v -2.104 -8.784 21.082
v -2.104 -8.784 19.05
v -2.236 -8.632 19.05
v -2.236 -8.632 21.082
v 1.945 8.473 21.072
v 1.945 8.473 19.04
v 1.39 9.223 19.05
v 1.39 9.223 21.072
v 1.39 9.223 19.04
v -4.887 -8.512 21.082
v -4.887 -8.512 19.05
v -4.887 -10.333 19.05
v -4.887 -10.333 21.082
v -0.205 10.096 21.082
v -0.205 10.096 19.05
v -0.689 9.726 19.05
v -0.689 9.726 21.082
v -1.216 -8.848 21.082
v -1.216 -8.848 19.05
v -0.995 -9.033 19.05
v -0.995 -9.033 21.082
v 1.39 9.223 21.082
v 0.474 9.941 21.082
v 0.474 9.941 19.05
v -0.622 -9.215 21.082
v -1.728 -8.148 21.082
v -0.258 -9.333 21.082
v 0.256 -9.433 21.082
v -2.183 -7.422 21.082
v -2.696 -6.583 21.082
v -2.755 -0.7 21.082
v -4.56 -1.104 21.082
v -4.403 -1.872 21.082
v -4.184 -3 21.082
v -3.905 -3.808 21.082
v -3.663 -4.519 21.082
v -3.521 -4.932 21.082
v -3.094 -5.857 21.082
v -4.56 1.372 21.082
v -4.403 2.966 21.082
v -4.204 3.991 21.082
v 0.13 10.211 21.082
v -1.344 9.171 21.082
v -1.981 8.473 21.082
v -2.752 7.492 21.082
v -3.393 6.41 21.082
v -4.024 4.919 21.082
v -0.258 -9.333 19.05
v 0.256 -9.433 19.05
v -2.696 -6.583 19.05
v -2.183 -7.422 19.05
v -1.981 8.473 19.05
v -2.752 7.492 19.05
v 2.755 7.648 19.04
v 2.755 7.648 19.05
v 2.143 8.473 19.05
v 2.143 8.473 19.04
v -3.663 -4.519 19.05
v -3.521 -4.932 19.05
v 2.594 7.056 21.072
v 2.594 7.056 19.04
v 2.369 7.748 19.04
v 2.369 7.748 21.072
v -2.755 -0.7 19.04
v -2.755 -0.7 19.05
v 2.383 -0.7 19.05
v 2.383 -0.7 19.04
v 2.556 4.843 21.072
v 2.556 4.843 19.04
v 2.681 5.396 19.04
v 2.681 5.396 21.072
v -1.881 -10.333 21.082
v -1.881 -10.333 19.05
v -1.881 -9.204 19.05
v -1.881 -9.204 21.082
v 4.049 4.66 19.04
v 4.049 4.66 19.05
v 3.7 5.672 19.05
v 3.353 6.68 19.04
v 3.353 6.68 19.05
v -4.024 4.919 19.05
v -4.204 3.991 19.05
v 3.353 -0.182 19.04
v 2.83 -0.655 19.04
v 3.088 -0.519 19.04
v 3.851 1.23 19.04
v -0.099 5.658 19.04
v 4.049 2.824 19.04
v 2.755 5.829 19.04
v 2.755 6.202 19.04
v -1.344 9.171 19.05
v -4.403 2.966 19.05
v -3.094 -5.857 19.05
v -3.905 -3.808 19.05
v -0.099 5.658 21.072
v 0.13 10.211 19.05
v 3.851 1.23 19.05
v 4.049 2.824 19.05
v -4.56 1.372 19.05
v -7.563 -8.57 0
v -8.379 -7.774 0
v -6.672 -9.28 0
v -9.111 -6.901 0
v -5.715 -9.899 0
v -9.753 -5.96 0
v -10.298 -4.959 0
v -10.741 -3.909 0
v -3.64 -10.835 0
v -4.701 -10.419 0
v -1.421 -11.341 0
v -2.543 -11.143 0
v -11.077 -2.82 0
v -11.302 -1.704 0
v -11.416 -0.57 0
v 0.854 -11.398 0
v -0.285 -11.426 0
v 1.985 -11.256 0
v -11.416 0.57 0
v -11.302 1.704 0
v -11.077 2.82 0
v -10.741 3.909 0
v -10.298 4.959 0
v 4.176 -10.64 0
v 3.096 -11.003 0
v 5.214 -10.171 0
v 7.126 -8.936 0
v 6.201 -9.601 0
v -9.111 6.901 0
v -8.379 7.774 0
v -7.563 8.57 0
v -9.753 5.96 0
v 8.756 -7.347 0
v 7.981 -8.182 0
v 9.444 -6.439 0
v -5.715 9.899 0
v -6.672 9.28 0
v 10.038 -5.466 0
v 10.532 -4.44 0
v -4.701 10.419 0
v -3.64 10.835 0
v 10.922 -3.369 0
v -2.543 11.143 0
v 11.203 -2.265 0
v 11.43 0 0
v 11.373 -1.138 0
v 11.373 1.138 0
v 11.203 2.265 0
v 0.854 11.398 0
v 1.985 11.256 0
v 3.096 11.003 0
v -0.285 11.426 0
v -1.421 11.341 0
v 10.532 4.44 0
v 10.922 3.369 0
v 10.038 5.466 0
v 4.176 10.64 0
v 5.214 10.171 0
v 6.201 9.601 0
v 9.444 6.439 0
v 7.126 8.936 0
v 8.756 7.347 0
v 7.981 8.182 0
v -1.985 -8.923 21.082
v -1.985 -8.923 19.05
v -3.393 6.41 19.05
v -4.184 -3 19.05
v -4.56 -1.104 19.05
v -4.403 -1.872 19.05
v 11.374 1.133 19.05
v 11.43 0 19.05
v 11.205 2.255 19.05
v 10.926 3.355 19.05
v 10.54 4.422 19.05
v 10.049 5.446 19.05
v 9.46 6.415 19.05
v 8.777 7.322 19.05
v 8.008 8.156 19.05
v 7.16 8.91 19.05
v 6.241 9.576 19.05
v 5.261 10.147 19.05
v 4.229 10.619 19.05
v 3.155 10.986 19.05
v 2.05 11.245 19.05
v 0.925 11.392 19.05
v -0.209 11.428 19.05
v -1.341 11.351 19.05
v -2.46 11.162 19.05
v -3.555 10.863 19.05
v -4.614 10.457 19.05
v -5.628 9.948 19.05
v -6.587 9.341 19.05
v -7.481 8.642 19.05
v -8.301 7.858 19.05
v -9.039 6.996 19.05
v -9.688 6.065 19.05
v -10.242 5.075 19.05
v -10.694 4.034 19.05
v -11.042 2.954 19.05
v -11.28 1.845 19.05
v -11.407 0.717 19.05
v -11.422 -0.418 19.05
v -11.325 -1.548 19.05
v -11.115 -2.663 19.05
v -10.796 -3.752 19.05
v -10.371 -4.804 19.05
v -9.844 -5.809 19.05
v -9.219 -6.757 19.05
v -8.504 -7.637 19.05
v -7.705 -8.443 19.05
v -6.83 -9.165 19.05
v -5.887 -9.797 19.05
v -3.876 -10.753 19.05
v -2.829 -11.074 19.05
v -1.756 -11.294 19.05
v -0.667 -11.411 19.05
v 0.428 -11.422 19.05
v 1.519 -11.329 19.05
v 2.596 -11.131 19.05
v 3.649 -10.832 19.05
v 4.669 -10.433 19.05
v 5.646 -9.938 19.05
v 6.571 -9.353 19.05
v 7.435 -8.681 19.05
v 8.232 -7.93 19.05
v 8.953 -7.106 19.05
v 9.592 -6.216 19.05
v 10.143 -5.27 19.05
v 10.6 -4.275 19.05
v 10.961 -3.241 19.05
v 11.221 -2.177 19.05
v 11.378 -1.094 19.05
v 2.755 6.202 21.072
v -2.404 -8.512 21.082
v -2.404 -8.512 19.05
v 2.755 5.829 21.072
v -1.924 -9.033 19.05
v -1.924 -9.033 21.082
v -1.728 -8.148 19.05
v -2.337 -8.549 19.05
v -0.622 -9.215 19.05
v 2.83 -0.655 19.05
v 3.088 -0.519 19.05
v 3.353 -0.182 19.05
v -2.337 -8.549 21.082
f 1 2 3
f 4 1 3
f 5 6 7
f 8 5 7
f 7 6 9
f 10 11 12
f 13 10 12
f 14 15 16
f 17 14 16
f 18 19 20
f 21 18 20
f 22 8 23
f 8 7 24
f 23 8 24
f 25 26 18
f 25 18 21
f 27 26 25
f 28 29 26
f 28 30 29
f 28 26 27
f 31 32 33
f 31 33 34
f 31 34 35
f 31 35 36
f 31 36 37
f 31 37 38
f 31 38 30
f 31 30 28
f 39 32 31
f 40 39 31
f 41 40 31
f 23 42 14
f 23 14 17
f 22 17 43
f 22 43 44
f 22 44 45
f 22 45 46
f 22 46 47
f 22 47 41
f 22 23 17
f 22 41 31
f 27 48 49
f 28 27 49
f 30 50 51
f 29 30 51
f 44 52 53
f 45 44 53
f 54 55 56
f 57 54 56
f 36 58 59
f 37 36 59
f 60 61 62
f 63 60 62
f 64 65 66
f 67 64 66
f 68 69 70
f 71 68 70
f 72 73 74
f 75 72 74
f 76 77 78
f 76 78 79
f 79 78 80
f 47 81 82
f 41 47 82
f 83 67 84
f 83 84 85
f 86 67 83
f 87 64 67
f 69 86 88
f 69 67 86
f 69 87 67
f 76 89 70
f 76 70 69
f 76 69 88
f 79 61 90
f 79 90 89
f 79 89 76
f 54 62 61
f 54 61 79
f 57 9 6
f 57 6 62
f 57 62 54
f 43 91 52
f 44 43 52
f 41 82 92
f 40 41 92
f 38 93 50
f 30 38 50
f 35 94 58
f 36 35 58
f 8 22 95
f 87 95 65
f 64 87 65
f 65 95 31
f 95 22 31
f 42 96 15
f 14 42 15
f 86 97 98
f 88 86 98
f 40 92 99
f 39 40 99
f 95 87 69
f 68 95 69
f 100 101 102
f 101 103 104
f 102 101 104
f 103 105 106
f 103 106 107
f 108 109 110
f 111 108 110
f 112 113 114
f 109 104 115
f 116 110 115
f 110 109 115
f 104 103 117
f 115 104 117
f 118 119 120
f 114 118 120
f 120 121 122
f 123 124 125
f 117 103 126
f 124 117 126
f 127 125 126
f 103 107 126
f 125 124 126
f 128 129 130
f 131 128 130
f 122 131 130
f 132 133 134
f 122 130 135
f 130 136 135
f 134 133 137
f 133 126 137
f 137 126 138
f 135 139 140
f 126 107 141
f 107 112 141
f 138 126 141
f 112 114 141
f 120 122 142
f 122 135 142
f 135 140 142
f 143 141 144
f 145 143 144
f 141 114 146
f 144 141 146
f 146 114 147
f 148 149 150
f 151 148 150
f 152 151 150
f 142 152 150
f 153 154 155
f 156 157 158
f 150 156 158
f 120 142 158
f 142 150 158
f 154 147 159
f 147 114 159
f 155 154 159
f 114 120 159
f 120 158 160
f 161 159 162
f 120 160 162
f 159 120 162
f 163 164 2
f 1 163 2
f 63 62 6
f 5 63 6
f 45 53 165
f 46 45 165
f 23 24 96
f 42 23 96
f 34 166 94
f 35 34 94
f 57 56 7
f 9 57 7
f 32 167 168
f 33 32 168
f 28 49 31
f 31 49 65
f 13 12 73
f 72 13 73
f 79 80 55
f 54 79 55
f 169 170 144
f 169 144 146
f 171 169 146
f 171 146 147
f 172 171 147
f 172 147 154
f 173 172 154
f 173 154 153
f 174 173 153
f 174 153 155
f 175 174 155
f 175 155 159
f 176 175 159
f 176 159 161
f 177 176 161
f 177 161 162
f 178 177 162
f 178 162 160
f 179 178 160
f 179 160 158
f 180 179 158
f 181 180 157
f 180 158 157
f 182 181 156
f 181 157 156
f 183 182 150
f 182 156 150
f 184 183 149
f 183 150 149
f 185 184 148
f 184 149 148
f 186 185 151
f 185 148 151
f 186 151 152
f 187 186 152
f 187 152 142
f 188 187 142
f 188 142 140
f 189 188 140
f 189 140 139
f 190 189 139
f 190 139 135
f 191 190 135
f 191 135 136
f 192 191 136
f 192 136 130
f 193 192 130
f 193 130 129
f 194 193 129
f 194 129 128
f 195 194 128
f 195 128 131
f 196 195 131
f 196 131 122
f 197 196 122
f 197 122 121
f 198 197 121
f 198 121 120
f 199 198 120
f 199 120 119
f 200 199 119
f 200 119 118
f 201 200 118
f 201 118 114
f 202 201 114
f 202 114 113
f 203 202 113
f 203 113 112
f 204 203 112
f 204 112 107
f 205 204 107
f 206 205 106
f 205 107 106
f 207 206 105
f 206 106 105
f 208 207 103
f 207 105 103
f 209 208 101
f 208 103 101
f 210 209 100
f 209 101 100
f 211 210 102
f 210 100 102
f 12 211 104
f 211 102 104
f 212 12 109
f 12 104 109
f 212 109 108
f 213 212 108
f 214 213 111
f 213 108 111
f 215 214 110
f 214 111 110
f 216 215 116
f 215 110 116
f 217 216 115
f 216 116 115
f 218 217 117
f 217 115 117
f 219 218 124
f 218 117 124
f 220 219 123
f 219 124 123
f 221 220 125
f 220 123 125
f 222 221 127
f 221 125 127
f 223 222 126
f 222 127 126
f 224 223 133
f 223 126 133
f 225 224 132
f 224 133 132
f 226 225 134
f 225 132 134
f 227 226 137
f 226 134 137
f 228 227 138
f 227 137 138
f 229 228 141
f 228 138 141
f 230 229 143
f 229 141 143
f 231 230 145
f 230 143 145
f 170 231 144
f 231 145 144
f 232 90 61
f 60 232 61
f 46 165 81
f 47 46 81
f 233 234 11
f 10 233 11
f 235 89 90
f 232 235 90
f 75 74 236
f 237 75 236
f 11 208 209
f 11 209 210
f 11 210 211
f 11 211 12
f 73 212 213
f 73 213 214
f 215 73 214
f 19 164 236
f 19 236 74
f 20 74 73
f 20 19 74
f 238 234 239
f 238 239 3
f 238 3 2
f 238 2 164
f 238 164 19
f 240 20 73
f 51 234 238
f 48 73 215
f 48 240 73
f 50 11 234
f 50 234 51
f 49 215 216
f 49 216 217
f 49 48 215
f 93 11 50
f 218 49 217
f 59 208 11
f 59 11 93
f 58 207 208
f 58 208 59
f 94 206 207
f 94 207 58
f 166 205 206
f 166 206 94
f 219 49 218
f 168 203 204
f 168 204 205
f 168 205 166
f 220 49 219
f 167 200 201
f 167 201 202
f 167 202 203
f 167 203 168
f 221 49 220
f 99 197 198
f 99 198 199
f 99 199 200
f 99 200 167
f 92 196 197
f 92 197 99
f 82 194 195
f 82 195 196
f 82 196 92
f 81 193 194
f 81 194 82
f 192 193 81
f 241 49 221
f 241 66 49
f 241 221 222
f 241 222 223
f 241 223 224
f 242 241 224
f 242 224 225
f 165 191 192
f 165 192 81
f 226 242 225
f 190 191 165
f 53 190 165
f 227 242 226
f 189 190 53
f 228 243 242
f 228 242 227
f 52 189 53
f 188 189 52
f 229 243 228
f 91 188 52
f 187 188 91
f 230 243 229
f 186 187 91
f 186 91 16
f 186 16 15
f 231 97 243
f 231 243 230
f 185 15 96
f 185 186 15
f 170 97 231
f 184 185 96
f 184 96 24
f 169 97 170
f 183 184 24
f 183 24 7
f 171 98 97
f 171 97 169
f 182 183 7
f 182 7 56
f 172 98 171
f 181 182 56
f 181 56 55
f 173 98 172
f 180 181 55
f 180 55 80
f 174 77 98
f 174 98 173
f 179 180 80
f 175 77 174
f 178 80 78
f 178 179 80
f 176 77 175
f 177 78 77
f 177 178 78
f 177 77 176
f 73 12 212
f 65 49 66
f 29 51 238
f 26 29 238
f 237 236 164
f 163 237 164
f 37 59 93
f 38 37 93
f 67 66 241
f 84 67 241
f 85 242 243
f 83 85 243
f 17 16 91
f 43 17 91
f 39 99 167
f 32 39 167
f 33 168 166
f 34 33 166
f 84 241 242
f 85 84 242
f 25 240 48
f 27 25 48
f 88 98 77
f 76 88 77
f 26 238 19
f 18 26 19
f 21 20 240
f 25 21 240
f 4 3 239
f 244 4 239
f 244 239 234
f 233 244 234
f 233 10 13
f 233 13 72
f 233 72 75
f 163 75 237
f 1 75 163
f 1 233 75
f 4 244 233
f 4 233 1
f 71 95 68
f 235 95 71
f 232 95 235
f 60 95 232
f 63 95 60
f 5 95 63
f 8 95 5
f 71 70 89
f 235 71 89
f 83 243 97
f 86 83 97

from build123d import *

# Parameters (mm, degrees)
F0_R     = 11.43
F1_DEPTH = 19.05
F4_DEPTH = 2.032
F5_DEPTH = 2.032
F7_DEPTH = 2.04216
F9_DEPTH = 2.032


# Not quite as in the source:
# - the program builds the solid bodies; features that only make, move or delete a surface that nothing else refers to are left out


with BuildPart() as f1:
    # F0 (on Top) → F1 (new body)
    with BuildSketch(Plane.XY):
        Circle(F0_R)
    extrude(amount=F1_DEPTH)

    # F2 (on face) → F4 (join)
    with BuildSketch(Plane.XY.offset(19.05)):
        Polygon((-1.880699303, -9.8758544773), (-1.880699303, -9.2042507604), (-1.9244262949, -9.0331919491), (-1.9849389791, -8.9233731851), (-2.1037228871, -8.7844179943), (-2.2359541617, -8.6320163682), (-2.3368084803, -8.5490914062), (-2.4040446151, -8.5124997422), (-4.8866966505, -8.5124997422), (-4.8866966505, -10.3327196733), (-1.880699303, -10.3327196733), align=None)
    extrude(amount=F4_DEPTH)

    # F3 (on face) → F5 (join)
    with BuildSketch(Plane.XY.offset(19.05)):
        Polygon((-1.7278705491, -8.1480639055), (-1.2155624572, -8.848301135), (-0.99472492, -9.0333931148), (-0.6215886096, -9.2146312818), (-0.2580773879, -9.3326671917), (0.2562761689, -9.4326803476), (-2.7548340149, -0.7004765794), (2.3825464305, -0.7004765794), (2.8303356376, -0.6551945116), (3.0876482706, -0.5188287272), (3.3525165636, -0.1815205032), (3.8505939301, 1.2300182134), (4.0490847188, 2.823865274), (4.0490847188, 3.8342506159), (4.0490847188, 4.6603621612), (3.7003470565, 5.6716995562), (3.3525165636, 6.6804061644), (2.7548240032, 7.6480992138), (2.1429003682, 8.4734838456), (1.3896959743, 9.2225758454), (0.4744292394, 9.9412809361), (0.1303268877, 10.2114842576), (-0.2051776682, 10.0957928225), (-0.6890241057, 9.7257923335), (-1.3436399167, 9.1707920656), (-1.9814397674, 8.4734838456), (-2.7524866164, 7.4915601872), (-3.3928717021, 6.4100213349), (-4.0235333078, 4.9190376551), (-4.2040259577, 3.9907894097), (-4.4032568112, 2.966173226), (-4.5597953722, 1.3723261654), (-4.5597953722, 0.5327102263), (-4.5597953722, -0.4492135195), (-4.5597953722, -1.1038292432), (-4.4032568112, -1.8722912064), (-4.1837464389, -2.9998348066), (-3.9051796775, -3.8076769561), (-3.6632562988, -4.519215785), (-3.5209483467, -4.9319081008), (-3.0940251891, -5.8569088578), (-2.6955632493, -6.5826787613), (-2.1829206962, -7.4222944677), align=None)
    extrude(amount=F5_DEPTH)

    # F6 (on face) → F7 (cut)
    with BuildSketch(Plane.XY.offset(21.082)):
        Polygon((1.3896959743, 9.2225758454), (-2.7548340149, -0.7004765794), (2.3825464305, -0.7004765794), (2.8303356376, -0.6551945116), (3.0876482706, -0.5188287272), (3.3525165636, -0.1815205032), (3.8505939301, 1.2300182134), (4.0490847188, 2.823865274), (4.0490847188, 4.6603621612), (3.3525165636, 6.6804061644), (2.7548240032, 7.6480992138), (2.1429003682, 8.4734838456), align=None)
    extrude(amount=-F7_DEPTH, mode=Mode.SUBTRACT)

    # F8 (on face) → F9 (join)
    with BuildSketch(Plane.XY.offset(19.03984)):
        Polygon((1.94505778, 8.4734838456), (1.3896959743, 9.2225758454), (-0.0989583414, 5.6583611201), (2.5561635848, 4.8432974145), (2.6805696543, 5.3959228098), (2.7548240032, 5.8293724433), (2.7548240032, 6.2017086893), (2.5935345329, 7.0562646724), (2.3686850909, 7.748354692), align=None)
    extrude(amount=F9_DEPTH)


solid = f1.part
